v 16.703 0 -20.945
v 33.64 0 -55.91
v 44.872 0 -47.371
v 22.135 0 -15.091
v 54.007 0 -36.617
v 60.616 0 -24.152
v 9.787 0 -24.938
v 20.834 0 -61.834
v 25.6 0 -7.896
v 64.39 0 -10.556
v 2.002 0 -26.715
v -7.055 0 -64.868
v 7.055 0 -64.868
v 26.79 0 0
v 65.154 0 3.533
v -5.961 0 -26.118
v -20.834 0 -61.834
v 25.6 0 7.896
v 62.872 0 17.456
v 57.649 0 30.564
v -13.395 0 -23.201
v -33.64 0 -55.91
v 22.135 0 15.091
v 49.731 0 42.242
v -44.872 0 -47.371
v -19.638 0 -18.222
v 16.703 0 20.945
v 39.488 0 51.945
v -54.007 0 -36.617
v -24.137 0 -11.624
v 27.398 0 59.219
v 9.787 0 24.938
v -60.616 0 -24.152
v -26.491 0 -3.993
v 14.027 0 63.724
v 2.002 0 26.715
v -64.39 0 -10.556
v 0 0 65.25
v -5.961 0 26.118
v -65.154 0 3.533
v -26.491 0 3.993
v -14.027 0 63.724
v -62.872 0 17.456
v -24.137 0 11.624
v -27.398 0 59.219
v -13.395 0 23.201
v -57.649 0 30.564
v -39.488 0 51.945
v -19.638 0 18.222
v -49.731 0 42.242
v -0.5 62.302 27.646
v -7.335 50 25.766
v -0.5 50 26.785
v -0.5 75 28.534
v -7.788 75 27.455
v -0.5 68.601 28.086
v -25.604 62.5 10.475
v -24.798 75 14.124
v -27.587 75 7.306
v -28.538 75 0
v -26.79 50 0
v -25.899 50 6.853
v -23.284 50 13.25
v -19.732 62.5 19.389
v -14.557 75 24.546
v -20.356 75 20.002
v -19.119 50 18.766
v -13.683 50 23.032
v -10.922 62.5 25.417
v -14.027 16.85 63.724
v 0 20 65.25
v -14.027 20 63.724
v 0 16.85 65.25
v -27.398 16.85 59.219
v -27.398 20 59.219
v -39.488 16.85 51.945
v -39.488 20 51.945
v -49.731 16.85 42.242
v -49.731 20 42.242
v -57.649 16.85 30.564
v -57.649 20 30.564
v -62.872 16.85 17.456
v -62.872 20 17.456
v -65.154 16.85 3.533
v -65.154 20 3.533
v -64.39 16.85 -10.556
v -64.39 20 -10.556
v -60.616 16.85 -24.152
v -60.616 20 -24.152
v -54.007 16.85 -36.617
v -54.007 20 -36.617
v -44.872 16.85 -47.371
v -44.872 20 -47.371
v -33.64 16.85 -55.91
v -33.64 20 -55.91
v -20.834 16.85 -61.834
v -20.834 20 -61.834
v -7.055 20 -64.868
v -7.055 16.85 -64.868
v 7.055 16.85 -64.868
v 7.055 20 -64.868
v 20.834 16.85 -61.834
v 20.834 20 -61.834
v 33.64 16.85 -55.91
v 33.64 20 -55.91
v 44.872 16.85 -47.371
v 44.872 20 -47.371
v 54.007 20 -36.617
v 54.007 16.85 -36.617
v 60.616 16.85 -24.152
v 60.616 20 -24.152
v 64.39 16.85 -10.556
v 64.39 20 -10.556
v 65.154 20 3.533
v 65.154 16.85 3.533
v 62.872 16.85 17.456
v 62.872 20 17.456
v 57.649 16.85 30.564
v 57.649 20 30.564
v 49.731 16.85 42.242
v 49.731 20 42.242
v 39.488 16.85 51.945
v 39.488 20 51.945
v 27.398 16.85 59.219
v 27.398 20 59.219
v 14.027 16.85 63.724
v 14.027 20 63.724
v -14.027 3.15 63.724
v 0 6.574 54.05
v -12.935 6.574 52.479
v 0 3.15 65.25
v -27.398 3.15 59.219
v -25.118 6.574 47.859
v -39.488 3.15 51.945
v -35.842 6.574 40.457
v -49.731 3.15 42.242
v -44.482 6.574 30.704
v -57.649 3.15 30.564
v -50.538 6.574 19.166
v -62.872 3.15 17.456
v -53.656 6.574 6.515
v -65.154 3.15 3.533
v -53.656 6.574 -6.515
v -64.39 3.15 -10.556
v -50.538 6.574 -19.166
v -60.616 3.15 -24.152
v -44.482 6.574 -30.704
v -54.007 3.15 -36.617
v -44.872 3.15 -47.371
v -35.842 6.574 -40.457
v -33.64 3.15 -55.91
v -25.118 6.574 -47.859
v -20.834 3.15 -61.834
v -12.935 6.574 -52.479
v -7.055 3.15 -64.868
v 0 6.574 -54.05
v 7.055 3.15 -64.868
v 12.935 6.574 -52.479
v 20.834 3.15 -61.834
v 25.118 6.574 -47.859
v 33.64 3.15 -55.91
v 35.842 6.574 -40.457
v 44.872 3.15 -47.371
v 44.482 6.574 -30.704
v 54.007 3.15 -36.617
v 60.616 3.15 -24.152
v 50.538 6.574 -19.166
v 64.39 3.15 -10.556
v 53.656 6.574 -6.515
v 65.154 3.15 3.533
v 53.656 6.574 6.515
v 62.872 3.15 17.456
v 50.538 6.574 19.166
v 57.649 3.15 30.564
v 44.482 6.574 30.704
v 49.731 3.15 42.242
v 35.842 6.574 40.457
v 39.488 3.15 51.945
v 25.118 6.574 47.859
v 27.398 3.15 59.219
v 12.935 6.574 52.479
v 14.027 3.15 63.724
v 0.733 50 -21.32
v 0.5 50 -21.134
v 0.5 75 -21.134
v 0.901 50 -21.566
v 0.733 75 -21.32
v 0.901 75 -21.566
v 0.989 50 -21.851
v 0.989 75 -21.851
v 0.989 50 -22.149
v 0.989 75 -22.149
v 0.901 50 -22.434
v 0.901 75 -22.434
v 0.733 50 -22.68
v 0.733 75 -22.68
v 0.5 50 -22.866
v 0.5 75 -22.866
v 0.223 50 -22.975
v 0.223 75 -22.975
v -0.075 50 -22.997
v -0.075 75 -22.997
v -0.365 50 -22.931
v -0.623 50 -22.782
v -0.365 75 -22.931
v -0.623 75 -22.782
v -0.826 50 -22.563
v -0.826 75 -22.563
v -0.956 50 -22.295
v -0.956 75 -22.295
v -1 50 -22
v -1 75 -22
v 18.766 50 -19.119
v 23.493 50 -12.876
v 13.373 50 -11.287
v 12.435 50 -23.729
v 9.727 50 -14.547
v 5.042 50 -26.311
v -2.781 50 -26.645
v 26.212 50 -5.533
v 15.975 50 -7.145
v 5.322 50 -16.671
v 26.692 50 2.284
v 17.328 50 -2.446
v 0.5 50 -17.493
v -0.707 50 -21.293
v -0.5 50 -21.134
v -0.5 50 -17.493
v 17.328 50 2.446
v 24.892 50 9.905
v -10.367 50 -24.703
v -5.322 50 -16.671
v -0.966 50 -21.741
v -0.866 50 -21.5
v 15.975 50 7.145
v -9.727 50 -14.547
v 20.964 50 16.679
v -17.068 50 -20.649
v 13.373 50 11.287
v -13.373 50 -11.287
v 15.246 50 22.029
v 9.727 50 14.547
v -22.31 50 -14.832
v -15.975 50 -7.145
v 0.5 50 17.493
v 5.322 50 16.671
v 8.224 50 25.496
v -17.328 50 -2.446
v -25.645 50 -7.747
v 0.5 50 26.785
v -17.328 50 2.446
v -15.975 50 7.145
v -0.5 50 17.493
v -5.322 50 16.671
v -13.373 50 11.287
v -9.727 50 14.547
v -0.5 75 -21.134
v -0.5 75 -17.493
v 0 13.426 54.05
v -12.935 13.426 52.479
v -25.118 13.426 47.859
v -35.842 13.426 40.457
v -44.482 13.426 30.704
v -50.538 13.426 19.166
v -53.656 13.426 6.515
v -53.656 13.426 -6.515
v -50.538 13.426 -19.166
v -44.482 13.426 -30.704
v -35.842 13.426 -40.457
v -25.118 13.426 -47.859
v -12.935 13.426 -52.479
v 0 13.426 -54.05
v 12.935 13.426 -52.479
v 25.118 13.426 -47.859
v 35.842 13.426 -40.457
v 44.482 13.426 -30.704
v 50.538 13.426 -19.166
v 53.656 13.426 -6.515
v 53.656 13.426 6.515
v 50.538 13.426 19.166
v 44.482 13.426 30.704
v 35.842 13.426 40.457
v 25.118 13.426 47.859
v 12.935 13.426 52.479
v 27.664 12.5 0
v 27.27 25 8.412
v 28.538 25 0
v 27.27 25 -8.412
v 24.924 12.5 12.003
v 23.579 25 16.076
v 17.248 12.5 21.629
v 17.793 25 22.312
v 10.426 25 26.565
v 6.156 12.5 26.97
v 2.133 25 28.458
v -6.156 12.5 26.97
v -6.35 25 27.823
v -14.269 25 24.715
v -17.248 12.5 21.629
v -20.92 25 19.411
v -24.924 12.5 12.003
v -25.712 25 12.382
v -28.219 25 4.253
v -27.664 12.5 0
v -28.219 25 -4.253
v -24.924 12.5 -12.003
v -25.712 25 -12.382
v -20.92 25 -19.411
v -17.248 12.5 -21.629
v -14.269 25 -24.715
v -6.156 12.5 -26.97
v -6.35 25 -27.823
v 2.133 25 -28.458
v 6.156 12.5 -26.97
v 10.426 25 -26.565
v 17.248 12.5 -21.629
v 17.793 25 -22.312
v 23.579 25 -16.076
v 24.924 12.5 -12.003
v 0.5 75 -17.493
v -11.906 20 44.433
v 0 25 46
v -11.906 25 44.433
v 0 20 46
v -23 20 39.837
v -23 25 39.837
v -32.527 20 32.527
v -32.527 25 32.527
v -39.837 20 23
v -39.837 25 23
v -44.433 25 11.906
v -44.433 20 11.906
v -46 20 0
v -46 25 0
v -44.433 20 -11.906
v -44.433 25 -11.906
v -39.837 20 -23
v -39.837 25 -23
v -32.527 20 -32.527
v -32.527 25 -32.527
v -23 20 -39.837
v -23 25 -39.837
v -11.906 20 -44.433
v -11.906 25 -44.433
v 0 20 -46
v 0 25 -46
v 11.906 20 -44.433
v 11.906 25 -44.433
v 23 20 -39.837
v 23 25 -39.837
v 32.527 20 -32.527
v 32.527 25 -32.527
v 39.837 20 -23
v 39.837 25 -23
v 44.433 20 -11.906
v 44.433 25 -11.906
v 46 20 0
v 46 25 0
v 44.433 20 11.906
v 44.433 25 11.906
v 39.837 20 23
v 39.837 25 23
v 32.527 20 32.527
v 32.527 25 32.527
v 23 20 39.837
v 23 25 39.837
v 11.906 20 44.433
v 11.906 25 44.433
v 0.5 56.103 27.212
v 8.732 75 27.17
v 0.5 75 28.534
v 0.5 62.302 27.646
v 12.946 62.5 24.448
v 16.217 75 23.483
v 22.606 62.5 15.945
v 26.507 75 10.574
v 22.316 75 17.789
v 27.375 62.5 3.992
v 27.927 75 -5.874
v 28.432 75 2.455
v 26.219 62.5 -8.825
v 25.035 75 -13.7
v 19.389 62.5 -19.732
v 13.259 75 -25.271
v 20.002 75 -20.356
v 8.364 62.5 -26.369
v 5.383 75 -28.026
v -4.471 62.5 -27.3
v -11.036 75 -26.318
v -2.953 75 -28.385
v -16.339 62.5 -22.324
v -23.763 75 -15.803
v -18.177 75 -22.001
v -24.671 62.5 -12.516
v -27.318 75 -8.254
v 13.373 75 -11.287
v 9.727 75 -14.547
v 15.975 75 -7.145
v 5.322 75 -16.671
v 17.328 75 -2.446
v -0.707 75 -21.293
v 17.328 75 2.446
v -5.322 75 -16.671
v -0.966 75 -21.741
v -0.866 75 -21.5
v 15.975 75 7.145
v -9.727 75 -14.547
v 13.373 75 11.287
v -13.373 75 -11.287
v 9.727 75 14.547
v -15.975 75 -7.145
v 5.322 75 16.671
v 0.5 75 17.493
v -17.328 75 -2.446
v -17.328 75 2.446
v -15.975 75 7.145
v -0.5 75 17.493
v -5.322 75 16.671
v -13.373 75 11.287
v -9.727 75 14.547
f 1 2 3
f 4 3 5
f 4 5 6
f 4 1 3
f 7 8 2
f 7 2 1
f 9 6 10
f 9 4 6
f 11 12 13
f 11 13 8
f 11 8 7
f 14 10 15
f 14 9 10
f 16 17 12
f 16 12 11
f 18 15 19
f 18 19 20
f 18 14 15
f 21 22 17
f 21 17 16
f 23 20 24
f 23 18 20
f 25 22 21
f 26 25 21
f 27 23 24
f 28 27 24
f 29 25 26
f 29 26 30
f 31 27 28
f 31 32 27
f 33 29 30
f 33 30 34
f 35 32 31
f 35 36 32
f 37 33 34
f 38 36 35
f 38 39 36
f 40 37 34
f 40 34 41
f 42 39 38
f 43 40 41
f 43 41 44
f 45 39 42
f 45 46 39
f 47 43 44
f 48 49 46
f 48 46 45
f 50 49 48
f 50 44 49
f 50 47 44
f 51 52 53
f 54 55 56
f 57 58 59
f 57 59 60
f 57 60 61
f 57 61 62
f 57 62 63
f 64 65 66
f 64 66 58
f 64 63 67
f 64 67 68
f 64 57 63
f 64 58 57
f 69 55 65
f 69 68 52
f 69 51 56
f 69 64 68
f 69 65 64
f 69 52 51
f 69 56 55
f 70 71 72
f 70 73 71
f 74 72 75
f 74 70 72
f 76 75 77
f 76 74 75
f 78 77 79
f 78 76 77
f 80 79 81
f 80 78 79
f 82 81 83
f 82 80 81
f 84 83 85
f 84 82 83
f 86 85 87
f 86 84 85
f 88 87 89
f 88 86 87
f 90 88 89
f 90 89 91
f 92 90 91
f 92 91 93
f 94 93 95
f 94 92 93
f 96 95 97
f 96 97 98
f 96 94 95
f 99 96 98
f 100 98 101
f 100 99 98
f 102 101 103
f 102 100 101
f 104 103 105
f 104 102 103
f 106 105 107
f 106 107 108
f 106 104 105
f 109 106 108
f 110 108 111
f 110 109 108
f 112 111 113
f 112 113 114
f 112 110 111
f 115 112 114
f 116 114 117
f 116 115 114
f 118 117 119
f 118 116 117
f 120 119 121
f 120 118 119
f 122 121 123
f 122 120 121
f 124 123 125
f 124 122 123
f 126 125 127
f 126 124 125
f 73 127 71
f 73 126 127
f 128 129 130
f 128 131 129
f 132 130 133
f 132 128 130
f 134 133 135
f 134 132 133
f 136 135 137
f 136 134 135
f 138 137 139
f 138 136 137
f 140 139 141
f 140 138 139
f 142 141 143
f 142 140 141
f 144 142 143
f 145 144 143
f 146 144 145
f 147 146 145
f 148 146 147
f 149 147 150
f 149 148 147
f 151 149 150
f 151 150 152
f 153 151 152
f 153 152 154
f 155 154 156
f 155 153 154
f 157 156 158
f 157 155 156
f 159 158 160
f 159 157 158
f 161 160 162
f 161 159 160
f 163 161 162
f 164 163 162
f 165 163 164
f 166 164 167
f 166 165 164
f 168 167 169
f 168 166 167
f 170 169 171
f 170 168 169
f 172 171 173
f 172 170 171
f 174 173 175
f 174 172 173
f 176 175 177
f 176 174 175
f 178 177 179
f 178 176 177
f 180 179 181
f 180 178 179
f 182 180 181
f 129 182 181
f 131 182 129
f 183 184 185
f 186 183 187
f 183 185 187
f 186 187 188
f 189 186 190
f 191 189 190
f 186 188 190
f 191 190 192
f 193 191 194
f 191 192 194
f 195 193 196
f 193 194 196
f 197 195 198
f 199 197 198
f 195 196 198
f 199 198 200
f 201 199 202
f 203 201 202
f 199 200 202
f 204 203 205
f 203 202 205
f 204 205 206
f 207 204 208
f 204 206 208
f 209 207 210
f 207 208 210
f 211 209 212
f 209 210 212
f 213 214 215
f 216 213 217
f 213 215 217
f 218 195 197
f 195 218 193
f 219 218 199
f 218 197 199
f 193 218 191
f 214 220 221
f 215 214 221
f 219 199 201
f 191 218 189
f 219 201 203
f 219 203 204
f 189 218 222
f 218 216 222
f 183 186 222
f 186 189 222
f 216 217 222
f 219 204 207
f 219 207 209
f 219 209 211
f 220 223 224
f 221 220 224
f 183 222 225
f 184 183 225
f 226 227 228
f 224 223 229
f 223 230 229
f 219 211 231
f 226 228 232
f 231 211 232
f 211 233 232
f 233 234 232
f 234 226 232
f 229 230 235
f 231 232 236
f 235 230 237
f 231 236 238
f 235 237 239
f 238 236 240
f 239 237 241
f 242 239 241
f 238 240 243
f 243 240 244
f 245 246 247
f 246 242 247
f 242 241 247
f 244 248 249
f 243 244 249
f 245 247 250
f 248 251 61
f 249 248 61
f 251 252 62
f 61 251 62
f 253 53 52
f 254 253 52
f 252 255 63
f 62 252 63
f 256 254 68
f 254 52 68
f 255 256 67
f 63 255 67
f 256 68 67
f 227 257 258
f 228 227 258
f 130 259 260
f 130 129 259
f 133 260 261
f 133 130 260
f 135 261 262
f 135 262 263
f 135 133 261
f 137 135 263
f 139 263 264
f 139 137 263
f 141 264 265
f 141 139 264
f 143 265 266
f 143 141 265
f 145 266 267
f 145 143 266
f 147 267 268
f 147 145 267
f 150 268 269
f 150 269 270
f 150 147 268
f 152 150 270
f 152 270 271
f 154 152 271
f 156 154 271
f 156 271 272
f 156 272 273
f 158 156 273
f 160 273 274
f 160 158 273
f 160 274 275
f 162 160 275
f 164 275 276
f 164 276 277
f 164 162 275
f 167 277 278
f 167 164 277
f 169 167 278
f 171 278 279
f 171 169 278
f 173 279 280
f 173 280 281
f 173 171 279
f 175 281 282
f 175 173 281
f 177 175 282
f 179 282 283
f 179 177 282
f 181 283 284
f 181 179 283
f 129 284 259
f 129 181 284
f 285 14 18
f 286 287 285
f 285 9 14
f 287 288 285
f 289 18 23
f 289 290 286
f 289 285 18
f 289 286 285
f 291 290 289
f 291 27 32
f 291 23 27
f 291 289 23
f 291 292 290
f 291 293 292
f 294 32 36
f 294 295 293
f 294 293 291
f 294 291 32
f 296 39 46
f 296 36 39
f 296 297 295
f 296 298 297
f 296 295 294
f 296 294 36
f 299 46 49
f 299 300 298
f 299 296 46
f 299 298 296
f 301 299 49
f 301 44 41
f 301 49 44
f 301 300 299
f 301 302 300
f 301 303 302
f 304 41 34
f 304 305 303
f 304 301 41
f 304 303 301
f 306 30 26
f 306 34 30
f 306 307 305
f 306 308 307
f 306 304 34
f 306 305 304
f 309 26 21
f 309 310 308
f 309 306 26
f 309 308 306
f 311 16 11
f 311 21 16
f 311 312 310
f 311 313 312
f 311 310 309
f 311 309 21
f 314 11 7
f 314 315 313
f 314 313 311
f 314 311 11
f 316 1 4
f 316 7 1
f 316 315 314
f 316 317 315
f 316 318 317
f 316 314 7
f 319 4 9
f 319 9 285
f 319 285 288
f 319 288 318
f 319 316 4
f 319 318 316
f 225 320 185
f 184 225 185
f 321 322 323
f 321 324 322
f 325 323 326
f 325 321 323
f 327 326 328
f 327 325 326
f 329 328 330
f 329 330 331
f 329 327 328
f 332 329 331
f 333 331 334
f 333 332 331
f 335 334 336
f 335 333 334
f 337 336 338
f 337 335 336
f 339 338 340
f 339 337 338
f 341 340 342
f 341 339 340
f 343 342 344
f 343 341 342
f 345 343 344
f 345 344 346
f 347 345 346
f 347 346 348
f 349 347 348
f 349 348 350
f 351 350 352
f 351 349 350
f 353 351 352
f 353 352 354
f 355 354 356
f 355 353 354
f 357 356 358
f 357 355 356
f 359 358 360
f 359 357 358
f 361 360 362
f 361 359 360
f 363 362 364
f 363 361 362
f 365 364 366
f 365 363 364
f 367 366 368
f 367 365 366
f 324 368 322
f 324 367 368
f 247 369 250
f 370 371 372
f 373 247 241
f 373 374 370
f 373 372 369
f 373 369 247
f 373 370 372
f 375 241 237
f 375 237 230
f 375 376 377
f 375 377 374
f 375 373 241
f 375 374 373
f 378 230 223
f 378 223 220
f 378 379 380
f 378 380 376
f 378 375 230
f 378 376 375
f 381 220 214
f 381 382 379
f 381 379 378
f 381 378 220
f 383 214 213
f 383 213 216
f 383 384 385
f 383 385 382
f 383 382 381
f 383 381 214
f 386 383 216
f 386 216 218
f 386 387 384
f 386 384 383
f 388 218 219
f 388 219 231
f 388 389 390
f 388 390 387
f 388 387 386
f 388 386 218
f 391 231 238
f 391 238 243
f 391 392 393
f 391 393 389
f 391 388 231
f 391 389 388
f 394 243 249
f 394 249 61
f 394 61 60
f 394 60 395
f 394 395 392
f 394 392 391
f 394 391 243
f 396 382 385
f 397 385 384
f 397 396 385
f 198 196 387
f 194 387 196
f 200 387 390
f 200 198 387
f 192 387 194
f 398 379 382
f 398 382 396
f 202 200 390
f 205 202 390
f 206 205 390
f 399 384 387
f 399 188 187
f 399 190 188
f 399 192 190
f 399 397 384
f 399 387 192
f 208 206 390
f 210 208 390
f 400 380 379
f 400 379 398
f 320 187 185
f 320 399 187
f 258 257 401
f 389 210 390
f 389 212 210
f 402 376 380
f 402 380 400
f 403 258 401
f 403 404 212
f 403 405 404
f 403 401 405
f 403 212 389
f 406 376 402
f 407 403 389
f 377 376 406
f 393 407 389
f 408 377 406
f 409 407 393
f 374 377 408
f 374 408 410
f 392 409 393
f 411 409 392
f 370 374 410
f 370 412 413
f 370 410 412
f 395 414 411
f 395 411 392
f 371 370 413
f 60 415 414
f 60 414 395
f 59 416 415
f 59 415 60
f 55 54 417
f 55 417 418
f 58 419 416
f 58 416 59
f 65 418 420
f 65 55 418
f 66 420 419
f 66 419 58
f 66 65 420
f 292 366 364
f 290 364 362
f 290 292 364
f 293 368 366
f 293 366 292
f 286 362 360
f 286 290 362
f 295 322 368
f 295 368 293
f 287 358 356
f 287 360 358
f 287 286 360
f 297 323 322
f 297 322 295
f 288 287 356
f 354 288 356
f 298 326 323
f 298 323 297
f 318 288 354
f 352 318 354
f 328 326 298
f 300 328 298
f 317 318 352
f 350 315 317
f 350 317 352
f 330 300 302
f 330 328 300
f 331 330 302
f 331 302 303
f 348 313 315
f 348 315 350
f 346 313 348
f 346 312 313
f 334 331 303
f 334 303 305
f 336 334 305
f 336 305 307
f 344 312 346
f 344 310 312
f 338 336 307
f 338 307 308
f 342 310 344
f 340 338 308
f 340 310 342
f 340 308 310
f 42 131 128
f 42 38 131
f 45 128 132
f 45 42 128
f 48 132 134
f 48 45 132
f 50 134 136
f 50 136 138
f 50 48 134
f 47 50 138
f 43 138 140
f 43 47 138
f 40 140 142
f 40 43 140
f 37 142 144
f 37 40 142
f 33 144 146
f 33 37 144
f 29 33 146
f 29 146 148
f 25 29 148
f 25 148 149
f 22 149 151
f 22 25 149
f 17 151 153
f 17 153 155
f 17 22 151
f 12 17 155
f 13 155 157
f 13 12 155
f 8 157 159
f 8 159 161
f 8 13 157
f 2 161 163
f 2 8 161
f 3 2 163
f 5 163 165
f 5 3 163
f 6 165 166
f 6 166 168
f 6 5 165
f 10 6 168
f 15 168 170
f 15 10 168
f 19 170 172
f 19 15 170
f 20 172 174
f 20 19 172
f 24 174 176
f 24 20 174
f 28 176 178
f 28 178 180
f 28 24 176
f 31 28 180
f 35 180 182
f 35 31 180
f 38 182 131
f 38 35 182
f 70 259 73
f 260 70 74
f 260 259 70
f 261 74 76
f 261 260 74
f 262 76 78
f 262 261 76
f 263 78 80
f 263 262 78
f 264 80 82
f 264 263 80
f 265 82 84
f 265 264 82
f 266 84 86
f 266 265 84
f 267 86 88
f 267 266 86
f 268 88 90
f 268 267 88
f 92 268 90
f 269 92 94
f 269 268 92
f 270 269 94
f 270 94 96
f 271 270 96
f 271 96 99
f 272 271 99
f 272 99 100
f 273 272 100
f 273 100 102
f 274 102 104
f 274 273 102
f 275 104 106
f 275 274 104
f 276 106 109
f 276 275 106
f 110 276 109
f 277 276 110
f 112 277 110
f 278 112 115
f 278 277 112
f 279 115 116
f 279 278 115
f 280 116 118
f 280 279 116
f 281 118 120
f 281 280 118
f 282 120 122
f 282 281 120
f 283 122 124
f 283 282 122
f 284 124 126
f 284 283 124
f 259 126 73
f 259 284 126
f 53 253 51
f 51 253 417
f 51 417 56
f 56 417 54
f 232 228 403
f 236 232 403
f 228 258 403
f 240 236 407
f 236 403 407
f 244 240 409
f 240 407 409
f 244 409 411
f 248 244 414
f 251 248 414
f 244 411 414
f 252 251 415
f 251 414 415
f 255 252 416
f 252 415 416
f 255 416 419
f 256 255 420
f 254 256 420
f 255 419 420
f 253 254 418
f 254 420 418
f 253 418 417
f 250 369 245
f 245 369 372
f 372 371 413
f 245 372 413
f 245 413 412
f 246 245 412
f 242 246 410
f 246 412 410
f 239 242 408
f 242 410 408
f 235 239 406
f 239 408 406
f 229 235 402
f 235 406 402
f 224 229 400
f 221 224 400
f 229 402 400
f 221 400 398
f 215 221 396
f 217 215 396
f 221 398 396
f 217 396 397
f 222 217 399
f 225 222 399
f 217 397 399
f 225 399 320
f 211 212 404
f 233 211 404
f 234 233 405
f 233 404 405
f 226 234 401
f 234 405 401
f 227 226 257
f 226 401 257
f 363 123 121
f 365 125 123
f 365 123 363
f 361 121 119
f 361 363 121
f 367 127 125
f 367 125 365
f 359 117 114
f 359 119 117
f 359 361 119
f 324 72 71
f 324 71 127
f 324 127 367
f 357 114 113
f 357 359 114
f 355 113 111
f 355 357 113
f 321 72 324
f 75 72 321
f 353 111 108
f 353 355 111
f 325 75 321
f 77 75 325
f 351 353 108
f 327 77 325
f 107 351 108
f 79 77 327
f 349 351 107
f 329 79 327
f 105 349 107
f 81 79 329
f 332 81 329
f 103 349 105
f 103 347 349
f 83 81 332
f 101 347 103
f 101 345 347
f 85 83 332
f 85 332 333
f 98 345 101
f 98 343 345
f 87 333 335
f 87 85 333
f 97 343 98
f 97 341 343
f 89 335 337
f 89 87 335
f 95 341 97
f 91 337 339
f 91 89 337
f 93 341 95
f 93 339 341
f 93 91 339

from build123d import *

# Parameters (mm, degrees)
F2_R      = 26.79
F3_DEPTH  = 25
F3_TAPER  = -4
F5_R      = 26.79
F6_DEPTH  = 25
F6_TAPER  = -4
F7_R      = 17.5
F8_DEPTH  = 25
F10_DEPTH = 25


with BuildPart() as f1:
    # F0 (on Right) → F1 (revolve)
    with BuildSketch(Plane.YZ):
        Polygon((0, 65.25), (0, 0), (25, 0), (25, 46), (20, 46), (20, 65.25), (16.85, 65.25), (13.4258163677, 54.05), (6.5741836323, 54.05), (3.15, 65.25), align=None)
    revolve(axis=Axis((0, 12.5, 0), (0, -1, 0)))

    # F2 (on face) → F3 (cut)
    with BuildSketch(Plane.XZ):
        Circle(F2_R)
    extrude(amount=-F3_DEPTH, taper=F3_TAPER, mode=Mode.SUBTRACT)


with BuildPart() as f6:
    # F5 (on offset) → F6 (new body)
    with BuildSketch(Plane(origin=(0, 50, 0), x_dir=(-1, 0, 0), z_dir=(0, 1, 0))):
        Circle(F5_R)
    extrude(amount=F6_DEPTH, taper=F6_TAPER)

    # F7 (on face) → F8 (cut, through all)
    with BuildSketch(Plane(origin=(0, 75, 0), x_dir=(-1, 0, 0), z_dir=(0, 1, 0))):
        Circle(F7_R)
    extrude(amount=-F8_DEPTH, mode=Mode.SUBTRACT)

    # F9 (on face) → F10 (cut, through all)
    with BuildSketch(Plane(origin=(0, 75, 0), x_dir=(-1, 0, 0), z_dir=(0, 1, 0))):
        with BuildLine():
            Line((0.5, -21.1339745962), (0.5, 30))
            Line((0.5, 30), (-0.5, 30))
            Line((-0.5, 30), (-0.5, -21.1339745962))
            ThreePointArc((-0.5, -21.1339745962), (0, -21), (0.5, -21.1339745962))
        make_face()
        with BuildLine():
            ThreePointArc((1, -22), (0.8660254038, -21.5), (0.5, -21.1339745962))
            Line((0.5, -21.1339745962), (0.5, -22))
            Line((0.5, -22), (-0.5, -22))
            Line((-0.5, -22), (-0.5, -21.1339745962))
            ThreePointArc((-0.5, -21.1339745962), (-0.5, -22.8660254038), (1, -22))
        make_face()
        with BuildLine():
            Line((0.5, -22), (0.5, -21.1339745962))
            ThreePointArc((0.5, -21.1339745962), (0, -21), (-0.5, -21.1339745962))
            Line((-0.5, -21.1339745962), (-0.5, -22))
            Line((-0.5, -22), (0.5, -22))
        make_face()
    extrude(amount=-F10_DEPTH, mode=Mode.SUBTRACT)


solid = Compound([f1.part, f6.part])
